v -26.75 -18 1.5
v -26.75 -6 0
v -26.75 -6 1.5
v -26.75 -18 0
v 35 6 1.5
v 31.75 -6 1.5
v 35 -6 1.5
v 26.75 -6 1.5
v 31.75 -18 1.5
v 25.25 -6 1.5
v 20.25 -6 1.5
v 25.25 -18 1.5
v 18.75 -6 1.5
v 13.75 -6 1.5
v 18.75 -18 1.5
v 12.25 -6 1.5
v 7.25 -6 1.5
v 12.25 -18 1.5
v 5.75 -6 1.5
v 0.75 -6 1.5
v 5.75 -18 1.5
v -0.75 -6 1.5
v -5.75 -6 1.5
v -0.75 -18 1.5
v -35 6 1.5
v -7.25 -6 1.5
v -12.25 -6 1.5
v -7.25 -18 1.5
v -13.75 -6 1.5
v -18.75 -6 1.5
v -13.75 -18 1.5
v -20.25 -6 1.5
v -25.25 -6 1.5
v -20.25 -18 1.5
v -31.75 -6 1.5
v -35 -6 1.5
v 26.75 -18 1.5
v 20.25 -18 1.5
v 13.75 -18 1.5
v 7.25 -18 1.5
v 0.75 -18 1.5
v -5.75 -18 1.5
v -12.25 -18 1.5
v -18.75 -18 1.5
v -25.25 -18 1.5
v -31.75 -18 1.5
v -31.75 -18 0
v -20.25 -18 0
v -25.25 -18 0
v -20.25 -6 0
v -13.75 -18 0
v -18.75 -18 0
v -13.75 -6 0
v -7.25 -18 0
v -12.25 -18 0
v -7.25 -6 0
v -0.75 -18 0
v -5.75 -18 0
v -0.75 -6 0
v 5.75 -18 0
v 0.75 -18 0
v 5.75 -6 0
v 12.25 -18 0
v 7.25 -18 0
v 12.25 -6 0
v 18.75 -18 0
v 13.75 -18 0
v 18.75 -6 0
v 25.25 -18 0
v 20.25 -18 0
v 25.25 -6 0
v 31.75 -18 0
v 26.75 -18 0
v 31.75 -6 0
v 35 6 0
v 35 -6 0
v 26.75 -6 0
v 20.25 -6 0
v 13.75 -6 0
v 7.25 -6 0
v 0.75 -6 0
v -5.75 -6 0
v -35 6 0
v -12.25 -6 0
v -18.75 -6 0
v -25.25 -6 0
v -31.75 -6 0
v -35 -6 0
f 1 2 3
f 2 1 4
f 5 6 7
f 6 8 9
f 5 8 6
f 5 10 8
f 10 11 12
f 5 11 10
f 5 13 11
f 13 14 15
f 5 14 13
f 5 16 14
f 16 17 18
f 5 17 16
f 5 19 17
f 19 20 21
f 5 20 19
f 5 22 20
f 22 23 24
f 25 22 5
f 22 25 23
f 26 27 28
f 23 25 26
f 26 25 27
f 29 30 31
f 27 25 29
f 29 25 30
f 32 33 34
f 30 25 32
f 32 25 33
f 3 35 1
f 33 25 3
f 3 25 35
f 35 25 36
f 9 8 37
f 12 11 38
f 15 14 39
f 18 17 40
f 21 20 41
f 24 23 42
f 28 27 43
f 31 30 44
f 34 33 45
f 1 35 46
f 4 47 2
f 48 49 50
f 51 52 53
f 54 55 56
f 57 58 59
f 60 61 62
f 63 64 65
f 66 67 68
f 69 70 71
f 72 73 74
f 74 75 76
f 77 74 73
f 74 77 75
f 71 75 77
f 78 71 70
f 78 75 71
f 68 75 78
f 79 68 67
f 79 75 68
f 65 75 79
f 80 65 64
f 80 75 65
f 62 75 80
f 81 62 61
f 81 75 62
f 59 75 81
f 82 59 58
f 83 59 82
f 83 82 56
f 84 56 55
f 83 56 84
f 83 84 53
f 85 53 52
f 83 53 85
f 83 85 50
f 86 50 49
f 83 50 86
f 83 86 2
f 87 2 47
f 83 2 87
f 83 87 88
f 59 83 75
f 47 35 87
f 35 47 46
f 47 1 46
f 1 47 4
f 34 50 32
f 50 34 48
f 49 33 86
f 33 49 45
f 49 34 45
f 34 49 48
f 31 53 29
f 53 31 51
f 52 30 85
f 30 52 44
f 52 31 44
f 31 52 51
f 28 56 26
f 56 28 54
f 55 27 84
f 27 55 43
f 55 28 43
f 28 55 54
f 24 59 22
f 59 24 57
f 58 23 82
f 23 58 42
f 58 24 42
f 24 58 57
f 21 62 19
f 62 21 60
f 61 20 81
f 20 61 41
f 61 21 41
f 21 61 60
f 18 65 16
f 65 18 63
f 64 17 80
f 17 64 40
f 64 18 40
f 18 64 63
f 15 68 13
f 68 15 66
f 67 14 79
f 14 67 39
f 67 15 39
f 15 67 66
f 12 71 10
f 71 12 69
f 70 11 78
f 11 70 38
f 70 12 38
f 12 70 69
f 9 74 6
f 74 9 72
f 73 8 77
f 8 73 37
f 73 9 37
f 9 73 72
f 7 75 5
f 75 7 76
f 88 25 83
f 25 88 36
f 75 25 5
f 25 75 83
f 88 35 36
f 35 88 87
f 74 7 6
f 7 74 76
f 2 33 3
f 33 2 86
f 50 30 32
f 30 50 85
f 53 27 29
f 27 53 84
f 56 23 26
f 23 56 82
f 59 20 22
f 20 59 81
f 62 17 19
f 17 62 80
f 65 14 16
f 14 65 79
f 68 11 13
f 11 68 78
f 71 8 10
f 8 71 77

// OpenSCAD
// 10-well agarose gel comb, printed lying flat
// Units: mm. Comb plate thickness (Z) = 1.5 mm.

// ---------- Parameters ----------
plate_t      = 1.5;    // comb plate thickness (Z)
spine_len    = 70;     // spine (back bar) length (X)
spine_w      = 12;     // spine width (Y)
teeth_count  = 10;     // number of wells/teeth
teeth_w      = 5.0;    // tooth width (X)
teeth_l      = 12;     // tooth length into plate (Y, from -Y edge)
gap          = 1.5;    // gap between neighbouring teeth (X)
eps          = 0.5;    // overshoot for clean boolean cuts

$fn = 64;

// Derived
pitch   = teeth_w + gap;              // centre-to-centre spacing
x_start = -(teeth_count - 1) * pitch / 2; // first tooth centre (row centred)

// ---------- Model ----------
union() {
    // Spine (back bar), full Y, on bed
    translate([-spine_len/2, -spine_w/2, 0])
        cube([spine_len, spine_w, plate_t]);

    // Teeth hanging from the -Y edge
    for (i = [0 : teeth_count - 1])
        translate([x_start + i * pitch - teeth_w/2,
                   -spine_w/2 - teeth_l,
                   0])
            cube([teeth_w, teeth_l + eps, plate_t]);
}
